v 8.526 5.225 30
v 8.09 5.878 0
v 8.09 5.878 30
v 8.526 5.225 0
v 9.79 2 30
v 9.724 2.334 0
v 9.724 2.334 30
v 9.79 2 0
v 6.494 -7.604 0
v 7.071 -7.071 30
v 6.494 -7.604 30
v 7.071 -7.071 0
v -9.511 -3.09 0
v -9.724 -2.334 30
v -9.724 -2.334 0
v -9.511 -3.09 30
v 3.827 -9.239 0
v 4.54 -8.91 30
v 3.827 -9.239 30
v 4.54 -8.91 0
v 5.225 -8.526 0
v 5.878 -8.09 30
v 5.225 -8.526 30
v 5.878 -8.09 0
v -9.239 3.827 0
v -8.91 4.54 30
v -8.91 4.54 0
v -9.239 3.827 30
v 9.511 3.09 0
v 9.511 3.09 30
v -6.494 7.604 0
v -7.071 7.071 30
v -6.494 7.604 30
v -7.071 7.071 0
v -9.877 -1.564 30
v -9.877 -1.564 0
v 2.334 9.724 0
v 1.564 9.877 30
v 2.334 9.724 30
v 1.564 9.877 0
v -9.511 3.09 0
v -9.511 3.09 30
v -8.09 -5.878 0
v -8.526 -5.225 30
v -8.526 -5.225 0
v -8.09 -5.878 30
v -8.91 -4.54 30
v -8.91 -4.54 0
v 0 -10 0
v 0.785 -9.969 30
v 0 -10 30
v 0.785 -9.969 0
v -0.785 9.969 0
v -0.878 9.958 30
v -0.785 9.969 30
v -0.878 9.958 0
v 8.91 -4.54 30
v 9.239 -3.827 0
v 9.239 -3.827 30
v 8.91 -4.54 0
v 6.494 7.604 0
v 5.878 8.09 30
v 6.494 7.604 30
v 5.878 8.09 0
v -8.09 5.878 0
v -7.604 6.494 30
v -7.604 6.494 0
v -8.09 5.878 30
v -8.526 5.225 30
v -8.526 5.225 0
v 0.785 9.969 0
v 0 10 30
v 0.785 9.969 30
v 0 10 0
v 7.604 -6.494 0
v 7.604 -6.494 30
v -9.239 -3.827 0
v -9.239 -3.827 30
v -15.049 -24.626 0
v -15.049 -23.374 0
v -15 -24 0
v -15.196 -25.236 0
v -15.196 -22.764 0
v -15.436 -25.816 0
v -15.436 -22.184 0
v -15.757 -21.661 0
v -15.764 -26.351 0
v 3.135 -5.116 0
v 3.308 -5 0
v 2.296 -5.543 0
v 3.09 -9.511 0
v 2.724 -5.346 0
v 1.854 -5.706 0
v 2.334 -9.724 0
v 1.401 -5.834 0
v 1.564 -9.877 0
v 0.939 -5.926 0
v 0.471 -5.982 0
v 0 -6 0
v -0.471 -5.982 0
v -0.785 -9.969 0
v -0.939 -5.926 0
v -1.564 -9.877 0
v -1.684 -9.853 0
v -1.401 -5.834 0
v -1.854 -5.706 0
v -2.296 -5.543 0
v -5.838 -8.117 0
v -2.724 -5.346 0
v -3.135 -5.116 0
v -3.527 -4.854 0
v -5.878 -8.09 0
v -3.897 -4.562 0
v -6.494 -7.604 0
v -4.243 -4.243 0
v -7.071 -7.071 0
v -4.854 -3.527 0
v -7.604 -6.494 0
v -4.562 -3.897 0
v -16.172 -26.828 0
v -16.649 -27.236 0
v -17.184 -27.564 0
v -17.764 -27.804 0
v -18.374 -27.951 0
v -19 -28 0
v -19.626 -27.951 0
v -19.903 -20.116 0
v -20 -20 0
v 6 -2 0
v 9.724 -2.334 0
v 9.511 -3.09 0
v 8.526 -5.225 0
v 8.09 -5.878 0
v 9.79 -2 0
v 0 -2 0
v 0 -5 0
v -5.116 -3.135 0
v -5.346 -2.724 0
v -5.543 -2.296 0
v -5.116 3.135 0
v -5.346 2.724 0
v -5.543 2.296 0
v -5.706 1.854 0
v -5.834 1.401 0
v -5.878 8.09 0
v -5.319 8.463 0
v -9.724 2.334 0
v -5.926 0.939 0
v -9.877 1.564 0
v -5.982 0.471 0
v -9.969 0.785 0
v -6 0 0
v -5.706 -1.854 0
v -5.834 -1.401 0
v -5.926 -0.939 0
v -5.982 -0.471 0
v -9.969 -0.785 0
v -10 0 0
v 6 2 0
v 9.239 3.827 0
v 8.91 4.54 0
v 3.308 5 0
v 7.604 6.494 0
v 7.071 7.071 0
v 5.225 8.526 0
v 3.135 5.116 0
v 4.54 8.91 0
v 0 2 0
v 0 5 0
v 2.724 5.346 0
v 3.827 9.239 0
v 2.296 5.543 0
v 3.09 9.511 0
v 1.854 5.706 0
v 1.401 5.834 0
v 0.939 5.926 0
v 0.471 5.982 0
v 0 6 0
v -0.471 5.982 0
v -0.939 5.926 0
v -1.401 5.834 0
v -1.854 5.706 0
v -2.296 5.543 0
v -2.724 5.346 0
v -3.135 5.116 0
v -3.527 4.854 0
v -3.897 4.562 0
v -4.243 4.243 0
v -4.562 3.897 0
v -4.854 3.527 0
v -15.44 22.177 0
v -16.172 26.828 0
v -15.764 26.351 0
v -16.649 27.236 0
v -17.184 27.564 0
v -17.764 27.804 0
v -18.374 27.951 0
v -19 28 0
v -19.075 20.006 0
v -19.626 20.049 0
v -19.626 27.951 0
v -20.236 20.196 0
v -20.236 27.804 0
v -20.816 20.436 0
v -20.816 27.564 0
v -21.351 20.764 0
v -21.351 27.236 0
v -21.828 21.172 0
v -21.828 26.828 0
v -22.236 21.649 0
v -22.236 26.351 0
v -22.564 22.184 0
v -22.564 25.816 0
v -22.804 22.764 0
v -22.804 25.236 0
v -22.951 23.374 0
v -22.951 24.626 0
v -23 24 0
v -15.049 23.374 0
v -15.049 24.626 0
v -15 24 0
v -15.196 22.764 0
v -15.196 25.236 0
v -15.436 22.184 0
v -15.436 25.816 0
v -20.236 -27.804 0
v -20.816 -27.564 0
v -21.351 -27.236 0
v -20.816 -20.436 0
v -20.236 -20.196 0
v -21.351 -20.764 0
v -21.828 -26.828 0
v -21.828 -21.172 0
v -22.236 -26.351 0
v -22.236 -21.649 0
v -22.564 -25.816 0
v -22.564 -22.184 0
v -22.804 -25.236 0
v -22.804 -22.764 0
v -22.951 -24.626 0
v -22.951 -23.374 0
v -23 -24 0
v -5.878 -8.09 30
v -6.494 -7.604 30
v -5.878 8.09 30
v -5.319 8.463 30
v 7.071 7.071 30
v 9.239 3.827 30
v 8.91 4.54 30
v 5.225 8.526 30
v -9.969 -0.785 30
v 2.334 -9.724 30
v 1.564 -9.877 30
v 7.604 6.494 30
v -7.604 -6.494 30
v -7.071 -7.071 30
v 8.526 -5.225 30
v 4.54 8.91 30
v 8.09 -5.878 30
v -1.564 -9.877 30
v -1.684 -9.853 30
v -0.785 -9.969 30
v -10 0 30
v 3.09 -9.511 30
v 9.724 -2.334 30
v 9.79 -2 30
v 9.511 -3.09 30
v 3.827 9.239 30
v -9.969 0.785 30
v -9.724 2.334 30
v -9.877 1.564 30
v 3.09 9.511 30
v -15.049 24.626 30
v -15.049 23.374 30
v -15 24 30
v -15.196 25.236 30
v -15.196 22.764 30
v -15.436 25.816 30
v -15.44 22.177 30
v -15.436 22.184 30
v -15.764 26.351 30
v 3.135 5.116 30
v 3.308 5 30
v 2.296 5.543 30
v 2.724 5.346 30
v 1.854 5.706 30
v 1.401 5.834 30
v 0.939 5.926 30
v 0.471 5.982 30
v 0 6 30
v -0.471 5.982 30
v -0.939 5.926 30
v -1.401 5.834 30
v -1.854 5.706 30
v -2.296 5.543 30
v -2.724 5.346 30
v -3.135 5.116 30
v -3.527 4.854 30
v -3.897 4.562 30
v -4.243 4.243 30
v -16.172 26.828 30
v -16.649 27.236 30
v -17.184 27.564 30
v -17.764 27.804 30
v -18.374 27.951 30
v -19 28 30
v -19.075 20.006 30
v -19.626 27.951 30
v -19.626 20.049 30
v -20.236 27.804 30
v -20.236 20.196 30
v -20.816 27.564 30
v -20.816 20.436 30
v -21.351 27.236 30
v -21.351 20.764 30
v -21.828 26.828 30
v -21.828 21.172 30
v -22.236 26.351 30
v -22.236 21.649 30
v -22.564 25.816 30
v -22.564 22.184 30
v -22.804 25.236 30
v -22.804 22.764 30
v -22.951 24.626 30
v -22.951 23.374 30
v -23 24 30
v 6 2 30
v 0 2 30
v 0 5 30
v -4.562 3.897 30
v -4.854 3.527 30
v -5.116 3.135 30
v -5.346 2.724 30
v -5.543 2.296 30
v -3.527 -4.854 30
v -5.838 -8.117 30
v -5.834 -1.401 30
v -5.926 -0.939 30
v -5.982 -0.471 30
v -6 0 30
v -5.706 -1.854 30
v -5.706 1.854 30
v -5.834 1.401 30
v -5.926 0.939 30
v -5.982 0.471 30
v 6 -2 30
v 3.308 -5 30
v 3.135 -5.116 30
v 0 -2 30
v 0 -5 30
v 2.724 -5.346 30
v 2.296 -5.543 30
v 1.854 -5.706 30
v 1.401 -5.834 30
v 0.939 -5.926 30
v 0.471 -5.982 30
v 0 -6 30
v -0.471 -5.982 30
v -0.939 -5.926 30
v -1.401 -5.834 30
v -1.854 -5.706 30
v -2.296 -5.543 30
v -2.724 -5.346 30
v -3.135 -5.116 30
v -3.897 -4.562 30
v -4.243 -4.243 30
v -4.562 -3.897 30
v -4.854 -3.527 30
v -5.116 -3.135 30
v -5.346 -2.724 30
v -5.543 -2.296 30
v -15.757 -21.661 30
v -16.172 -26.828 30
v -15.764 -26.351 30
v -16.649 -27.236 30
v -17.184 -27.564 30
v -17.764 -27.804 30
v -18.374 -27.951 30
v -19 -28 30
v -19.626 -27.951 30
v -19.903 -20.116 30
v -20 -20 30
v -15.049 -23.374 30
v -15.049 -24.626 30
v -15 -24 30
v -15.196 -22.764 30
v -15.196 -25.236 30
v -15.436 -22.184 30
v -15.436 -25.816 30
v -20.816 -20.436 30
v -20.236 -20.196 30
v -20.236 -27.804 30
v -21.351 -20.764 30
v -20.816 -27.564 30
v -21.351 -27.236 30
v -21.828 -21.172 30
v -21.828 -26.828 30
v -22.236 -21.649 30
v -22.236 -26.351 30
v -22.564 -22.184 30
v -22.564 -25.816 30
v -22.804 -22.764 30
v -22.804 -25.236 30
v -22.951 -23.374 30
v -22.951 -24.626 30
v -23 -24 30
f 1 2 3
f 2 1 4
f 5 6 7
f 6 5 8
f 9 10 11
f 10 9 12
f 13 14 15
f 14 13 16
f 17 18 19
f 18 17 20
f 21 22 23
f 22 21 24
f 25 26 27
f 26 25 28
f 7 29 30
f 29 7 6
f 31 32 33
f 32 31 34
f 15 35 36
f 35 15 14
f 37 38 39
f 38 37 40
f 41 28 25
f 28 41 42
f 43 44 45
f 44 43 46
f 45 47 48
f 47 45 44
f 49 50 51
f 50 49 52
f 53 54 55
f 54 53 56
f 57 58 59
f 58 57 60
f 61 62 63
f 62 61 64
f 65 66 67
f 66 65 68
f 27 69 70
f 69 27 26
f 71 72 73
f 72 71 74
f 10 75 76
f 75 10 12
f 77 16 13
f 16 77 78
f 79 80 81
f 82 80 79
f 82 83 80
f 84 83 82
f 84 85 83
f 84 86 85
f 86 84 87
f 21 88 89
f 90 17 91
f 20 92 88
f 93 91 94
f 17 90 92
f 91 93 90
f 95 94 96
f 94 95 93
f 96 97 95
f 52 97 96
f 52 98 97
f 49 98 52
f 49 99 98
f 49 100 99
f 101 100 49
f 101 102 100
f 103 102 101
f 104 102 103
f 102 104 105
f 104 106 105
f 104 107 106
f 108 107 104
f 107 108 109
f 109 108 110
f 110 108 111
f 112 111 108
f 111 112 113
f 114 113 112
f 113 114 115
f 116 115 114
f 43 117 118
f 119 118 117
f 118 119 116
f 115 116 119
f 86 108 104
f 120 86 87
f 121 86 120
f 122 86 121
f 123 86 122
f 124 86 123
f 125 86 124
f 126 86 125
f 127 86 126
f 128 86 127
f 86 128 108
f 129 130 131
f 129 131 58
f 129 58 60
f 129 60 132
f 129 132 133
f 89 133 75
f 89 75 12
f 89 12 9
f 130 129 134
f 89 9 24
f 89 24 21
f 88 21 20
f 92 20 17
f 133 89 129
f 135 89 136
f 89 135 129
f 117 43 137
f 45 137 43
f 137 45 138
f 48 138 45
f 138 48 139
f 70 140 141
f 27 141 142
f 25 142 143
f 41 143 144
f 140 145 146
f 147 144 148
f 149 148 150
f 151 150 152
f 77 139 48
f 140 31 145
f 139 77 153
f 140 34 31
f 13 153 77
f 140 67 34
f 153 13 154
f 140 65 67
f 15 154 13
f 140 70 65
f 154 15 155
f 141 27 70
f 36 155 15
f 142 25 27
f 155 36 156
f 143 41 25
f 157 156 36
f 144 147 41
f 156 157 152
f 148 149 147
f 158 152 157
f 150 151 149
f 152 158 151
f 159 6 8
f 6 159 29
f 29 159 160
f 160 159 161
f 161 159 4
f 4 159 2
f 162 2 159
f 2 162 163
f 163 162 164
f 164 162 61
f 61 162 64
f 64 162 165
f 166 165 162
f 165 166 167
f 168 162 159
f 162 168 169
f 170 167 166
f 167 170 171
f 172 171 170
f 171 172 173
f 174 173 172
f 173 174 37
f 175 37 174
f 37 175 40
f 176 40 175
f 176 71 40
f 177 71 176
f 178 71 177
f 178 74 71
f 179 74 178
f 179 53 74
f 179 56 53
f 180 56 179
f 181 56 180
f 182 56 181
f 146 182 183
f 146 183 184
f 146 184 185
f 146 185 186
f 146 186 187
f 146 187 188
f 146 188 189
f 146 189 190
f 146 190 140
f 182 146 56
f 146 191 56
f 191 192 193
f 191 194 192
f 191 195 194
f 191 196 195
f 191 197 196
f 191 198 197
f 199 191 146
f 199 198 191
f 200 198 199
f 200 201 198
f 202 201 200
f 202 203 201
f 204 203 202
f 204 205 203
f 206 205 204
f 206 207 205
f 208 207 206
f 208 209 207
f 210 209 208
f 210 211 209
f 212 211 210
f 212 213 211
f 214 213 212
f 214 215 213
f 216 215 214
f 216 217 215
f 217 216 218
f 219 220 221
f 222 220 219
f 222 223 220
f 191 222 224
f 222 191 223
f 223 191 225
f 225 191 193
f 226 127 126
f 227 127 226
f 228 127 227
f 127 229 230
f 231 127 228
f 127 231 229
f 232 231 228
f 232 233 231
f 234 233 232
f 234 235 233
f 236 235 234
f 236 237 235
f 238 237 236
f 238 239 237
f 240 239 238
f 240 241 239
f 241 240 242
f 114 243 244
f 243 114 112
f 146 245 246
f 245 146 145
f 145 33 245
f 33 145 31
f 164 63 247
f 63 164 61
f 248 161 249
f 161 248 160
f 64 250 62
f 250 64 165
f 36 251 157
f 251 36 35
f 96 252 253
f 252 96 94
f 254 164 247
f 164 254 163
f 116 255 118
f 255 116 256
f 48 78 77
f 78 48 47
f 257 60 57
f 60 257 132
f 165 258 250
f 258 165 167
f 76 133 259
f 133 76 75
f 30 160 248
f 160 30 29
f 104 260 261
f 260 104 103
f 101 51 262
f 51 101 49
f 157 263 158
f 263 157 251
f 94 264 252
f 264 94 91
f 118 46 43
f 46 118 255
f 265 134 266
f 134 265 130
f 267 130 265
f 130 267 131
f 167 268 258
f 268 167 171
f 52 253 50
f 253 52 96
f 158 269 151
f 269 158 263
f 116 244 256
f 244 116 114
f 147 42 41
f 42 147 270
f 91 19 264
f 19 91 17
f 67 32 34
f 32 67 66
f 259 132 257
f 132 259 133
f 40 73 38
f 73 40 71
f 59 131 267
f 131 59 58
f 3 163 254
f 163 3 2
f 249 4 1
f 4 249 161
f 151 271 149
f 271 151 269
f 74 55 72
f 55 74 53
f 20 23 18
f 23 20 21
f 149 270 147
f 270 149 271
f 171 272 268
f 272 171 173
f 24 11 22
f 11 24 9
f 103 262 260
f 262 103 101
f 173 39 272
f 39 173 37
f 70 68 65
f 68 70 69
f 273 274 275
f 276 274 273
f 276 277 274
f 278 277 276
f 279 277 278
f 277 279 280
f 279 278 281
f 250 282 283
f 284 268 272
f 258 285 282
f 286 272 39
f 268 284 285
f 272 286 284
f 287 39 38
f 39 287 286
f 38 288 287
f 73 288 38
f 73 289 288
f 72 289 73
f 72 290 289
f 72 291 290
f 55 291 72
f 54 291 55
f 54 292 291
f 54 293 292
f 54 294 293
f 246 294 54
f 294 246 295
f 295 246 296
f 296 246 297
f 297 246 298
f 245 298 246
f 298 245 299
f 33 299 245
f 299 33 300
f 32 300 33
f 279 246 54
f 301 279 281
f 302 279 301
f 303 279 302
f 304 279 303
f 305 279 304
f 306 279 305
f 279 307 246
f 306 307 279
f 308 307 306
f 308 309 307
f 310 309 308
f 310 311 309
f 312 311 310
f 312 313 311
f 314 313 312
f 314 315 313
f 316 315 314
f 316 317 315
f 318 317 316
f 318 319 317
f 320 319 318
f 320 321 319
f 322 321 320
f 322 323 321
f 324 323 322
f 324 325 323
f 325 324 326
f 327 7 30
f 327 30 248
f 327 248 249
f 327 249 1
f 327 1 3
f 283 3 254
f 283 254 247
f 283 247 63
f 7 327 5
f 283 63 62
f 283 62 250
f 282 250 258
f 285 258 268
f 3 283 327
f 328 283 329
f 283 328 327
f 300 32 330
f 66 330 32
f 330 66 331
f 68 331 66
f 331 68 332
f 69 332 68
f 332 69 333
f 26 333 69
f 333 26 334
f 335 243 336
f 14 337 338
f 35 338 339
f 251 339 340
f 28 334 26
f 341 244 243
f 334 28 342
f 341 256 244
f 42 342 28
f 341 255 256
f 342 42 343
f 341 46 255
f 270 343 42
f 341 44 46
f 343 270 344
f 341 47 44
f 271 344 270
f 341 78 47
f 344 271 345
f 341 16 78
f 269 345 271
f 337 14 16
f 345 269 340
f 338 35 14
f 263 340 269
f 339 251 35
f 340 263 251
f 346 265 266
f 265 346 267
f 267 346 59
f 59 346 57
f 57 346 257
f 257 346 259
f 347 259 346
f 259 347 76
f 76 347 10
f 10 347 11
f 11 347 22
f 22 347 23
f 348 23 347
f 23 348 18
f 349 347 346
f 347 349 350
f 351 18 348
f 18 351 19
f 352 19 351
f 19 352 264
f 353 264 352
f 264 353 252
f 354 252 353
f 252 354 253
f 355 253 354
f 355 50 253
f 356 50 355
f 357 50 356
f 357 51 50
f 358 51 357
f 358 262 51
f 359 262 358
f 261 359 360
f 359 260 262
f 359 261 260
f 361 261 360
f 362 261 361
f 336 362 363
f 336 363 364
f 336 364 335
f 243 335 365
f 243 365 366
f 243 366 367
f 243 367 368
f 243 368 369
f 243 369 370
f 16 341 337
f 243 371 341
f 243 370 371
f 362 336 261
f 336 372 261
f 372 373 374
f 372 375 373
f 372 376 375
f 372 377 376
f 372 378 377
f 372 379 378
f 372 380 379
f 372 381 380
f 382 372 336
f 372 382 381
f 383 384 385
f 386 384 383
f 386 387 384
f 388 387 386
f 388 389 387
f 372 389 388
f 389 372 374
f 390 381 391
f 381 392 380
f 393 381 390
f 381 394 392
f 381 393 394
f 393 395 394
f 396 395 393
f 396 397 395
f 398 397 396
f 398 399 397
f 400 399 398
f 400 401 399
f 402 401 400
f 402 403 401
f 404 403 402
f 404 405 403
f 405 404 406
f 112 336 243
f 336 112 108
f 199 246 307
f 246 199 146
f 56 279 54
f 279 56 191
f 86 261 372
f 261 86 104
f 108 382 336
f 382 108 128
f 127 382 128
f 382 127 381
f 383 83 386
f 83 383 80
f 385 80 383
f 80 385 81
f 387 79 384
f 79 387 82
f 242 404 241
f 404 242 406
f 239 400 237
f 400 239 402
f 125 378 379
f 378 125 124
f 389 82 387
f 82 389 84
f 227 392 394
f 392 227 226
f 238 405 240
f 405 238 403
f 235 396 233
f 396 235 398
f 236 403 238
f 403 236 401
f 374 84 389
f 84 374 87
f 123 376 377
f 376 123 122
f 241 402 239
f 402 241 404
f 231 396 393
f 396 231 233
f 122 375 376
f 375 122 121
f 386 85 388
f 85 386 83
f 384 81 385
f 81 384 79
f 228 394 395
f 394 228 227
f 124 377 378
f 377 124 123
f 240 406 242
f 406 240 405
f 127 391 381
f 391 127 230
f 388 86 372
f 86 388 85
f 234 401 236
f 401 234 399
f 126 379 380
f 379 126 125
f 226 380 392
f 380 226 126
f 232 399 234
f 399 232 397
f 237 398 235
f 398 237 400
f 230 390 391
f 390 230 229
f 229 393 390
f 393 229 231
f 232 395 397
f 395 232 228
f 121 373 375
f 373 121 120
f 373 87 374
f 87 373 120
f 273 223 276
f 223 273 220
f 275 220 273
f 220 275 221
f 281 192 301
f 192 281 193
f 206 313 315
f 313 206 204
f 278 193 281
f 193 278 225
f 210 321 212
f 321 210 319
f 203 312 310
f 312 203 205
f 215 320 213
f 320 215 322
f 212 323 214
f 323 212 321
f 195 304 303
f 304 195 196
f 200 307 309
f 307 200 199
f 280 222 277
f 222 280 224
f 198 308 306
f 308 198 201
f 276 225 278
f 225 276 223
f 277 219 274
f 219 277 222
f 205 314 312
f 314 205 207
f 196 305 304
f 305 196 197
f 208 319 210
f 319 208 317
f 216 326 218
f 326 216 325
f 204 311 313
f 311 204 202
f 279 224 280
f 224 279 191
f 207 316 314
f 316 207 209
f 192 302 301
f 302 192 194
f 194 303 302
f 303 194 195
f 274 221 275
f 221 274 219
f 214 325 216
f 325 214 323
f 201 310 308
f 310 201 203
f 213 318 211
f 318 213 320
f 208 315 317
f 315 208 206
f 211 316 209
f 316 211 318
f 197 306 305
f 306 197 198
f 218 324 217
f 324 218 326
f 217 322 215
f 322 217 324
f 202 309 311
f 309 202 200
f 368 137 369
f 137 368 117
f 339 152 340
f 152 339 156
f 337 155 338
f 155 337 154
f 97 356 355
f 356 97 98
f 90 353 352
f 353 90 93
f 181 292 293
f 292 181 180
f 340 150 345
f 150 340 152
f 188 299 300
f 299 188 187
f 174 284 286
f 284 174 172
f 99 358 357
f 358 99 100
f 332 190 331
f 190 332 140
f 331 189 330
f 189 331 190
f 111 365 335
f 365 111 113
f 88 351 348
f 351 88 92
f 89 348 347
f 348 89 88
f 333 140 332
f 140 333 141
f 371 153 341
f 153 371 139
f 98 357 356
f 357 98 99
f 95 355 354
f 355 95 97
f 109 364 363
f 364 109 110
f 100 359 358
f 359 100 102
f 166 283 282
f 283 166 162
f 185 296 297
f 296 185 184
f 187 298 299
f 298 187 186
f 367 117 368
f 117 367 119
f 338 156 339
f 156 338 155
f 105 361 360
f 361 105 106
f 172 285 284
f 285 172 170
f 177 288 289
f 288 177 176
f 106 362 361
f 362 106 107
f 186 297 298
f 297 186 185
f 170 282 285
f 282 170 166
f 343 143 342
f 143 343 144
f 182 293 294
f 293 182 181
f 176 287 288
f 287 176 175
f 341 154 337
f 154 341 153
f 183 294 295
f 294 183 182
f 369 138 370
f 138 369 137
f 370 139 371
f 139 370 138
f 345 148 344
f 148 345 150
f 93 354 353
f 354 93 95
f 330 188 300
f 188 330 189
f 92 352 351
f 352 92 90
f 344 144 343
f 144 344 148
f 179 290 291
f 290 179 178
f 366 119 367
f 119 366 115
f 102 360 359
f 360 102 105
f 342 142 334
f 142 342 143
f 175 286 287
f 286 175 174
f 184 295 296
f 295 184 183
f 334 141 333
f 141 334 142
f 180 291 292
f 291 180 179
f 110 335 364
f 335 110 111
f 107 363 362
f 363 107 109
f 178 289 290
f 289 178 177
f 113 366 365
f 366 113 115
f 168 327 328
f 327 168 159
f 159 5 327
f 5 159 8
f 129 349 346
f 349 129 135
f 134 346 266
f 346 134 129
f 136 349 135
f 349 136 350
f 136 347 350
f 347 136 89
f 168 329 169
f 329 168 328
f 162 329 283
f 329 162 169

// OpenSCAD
difference() {
  union() {
    cylinder(r=10,h=30,$fn=80);
    translate([0,4,0]) rotate([0,0,50]) cube([4,25,30]);
    translate([-20,-20,0]) rotate([0,0,-50]) cube([4,25,30]);
    translate([-19,-24,0]) cylinder(r=4,h=30,$fn=40);
    translate([-19,24,0]) cylinder(r=4,h=30,$fn=40); 
  }
  translate([0,0,-1]) cylinder(r=6,h=32,$fn=80);
  translate([20,0,0]) cube([40,4,80],center=true);
}
translate([0,-5,0]) cube([6,3,30]);
translate([0,2,0]) cube([6,3,30]);
